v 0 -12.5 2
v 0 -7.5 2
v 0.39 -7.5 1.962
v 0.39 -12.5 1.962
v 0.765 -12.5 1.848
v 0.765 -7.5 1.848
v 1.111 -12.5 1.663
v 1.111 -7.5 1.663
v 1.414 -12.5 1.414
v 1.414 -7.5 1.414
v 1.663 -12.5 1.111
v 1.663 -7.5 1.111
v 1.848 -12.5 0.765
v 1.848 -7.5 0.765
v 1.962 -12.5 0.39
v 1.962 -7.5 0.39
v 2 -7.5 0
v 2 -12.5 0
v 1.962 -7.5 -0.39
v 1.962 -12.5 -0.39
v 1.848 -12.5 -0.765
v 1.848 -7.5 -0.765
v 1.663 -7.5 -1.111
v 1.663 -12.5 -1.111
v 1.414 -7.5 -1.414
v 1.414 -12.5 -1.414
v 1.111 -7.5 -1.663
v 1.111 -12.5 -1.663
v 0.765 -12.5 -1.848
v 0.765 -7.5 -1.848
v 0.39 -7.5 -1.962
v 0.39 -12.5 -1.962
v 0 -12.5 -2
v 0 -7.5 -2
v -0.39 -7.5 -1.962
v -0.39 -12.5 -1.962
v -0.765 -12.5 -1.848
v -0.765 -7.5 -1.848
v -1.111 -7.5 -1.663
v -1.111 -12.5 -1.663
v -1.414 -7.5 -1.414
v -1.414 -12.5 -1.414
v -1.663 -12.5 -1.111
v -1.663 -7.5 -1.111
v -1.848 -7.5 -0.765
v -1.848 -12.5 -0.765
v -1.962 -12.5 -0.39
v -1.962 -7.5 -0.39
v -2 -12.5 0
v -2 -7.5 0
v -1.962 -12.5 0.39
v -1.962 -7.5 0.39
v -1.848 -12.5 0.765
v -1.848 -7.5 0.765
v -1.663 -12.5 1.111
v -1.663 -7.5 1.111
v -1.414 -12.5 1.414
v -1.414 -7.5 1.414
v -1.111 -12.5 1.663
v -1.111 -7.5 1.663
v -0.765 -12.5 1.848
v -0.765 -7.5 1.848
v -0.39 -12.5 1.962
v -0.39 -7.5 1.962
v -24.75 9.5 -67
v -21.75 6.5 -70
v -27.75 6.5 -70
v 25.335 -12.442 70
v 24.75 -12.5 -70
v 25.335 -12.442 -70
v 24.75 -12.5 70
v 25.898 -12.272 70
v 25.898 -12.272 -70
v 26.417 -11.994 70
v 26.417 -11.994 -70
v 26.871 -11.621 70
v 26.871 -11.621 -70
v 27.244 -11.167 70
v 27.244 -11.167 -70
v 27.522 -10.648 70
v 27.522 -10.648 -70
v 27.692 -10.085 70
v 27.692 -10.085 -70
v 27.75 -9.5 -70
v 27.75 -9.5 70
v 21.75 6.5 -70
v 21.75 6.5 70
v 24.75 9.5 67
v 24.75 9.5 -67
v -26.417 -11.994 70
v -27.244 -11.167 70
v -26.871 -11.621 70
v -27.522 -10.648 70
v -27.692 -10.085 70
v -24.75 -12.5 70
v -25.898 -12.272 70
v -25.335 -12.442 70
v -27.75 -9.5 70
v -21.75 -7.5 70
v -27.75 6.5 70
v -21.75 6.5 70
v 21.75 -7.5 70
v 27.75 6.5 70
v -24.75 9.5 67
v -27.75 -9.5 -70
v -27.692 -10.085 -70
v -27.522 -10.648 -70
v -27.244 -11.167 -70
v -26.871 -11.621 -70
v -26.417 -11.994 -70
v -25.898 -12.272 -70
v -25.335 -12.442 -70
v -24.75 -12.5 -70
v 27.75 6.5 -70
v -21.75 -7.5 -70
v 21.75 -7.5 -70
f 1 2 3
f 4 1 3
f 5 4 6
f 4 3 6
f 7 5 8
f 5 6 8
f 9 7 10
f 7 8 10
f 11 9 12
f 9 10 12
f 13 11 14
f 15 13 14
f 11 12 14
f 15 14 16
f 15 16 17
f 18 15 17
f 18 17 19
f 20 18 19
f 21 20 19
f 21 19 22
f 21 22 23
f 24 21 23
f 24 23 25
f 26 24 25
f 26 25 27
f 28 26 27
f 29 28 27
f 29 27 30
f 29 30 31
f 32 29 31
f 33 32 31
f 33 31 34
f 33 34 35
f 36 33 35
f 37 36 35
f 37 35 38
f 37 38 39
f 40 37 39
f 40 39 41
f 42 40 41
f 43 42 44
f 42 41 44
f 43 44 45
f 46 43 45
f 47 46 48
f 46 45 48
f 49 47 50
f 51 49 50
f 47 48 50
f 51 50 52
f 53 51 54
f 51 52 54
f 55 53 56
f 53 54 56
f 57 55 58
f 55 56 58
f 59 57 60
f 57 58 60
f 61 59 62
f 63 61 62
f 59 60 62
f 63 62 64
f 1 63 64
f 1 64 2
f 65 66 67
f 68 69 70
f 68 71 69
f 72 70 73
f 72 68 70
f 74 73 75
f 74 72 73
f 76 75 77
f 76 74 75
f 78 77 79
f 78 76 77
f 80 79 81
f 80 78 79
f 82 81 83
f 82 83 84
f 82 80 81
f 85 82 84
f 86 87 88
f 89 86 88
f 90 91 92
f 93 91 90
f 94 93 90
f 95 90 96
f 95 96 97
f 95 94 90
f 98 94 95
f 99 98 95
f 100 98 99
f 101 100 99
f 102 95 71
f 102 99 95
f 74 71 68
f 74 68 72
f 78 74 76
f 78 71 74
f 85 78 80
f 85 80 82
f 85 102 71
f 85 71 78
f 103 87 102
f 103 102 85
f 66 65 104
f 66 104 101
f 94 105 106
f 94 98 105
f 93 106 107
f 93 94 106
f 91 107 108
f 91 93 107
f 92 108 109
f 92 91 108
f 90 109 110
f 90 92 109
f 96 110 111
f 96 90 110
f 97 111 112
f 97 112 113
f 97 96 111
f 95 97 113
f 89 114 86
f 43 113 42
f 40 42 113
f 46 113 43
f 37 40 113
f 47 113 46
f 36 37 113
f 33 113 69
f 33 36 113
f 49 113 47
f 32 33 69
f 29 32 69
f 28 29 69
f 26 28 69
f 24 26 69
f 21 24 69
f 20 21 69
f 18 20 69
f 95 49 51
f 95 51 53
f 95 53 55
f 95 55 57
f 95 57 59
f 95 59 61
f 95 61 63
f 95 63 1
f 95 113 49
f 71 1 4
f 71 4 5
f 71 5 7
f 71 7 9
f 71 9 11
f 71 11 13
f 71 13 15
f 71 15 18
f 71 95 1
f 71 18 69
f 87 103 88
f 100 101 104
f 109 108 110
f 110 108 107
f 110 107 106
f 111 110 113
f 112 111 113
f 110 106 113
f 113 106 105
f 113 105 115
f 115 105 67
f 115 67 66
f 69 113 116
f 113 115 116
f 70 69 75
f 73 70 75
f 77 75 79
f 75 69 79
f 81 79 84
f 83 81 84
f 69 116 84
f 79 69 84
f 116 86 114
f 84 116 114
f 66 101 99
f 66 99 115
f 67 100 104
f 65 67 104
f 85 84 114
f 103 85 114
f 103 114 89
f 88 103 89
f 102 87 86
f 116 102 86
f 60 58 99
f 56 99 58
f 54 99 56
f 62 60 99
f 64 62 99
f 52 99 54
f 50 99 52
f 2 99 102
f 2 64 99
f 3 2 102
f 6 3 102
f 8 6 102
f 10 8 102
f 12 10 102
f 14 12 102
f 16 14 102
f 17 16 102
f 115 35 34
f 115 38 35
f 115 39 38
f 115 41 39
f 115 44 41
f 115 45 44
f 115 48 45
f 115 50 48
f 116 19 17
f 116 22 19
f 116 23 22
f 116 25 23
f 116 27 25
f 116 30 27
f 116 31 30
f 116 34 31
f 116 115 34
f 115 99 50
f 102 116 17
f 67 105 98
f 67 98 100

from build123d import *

# Parameters (mm, degrees)
SKETCH1_W           = 55.5
SKETCH1_H           = 25
BOSS_EXTRUDE1_DEPTH = 70
SKETCH2_W           = 43.5
SKETCH2_H           = 150
CUT_EXTRUDE1_DEPTH  = 20
SKETCH3_R           = 2
CUT_EXTRUDE2_DEPTH  = 78.910605825
FILLET1_R           = 3
CHAMFER1_SIZE       = 6


with BuildPart() as part:
    # Sketch1 → Boss-Extrude1 (new, symmetric)
    with BuildSketch(Plane.XY):
        Rectangle(SKETCH1_W, SKETCH1_H)
    extrude(amount=BOSS_EXTRUDE1_DEPTH, both=True)

    # Sketch2 → Cut-Extrude1 (cut)
    with BuildSketch(Plane(origin=(0, 12.5, 0), x_dir=(1, 0, 0), z_dir=(0, 1, 0))):
        Rectangle(SKETCH2_W, SKETCH2_H)
    extrude(amount=-CUT_EXTRUDE1_DEPTH, mode=Mode.SUBTRACT)

    # Sketch3 → Cut-Extrude2 (cut, through all)
    with BuildSketch(Plane(origin=(0, -7.5, 0), x_dir=(1, 0, 0), z_dir=(0, 1, 0))):
        with Locations(Location((0, 0, 0), (0, 0, 270))):
            Circle(SKETCH3_R)
    extrude(amount=-CUT_EXTRUDE2_DEPTH, mode=Mode.SUBTRACT)

    # Fillet1
    fillet1_edges = [part.edges().sort_by_distance(p)[0] for p in [
        (27.75, -12.5, 0),
        (-27.75, -12.5, 0),
    ]]
    fillet(fillet1_edges, radius=FILLET1_R)

    # Chamfer1
    # the kernel refuses this chamfer: 6 mm, written as the material it takes off along each edge
    with BuildSketch(Plane(origin=(-6.319902072, 12.5, -70), x_dir=(0, -0.9996219169112968, -0.027495876610586778), z_dir=(-1, 0, 0)), Plane(origin=(43.180097928, 12.5, -70), x_dir=(0, -0.9996219169112968, -0.027495876610586778), z_dir=(-1, 0, 0))) as chamfer1_piece_1:
        Polygon((CHAMFER1_SIZE * 0.999621916911, CHAMFER1_SIZE * 0.0274958766106), (-CHAMFER1_SIZE * 0.0274958766106, CHAMFER1_SIZE * 0.999621916911), (0, 0), align=None)
    extrude(amount=36.860195856, mode=Mode.SUBTRACT)
    with BuildSketch(Plane(origin=(-6.319902072, 12.5, 70), x_dir=(0, -0.9996219169112968, 0.027495876610586778), z_dir=(-1, 0, 0)), Plane(origin=(43.180097928, 12.5, 70), x_dir=(0, -0.9996219169112968, 0.027495876610586778), z_dir=(-1, 0, 0))) as chamfer1_piece_2:
        Polygon((CHAMFER1_SIZE * 0.999621916911, -CHAMFER1_SIZE * 0.0274958766106), (-CHAMFER1_SIZE * 0.0274958766106, -CHAMFER1_SIZE * 0.999621916911), (0, 0), align=None)
    extrude(amount=36.860195856, mode=Mode.SUBTRACT)
    with BuildSketch(Plane(origin=(21.75, 12.5, 85.430097928), x_dir=(-0.027495876610586202, -0.9996219169112968, 0), z_dir=(0, 0, -1)), Plane(origin=(-27.75, 12.5, 85.430097928), x_dir=(-0.027495876610586202, -0.9996219169112968, 0), z_dir=(0, 0, -1)), Plane(origin=(27.75, 12.5, -85.430097928), x_dir=(0.027495876610586202, -0.9996219169112968, 0), z_dir=(0, 0, 1))) as chamfer1_piece_3:
        Polygon((CHAMFER1_SIZE * 0.999621916911, -CHAMFER1_SIZE * 0.0274958766106), (-CHAMFER1_SIZE * 0.0274958766106, -CHAMFER1_SIZE * 0.999621916911), (0, 0), align=None)
    extrude(amount=170.860195856, mode=Mode.SUBTRACT)
    with BuildSketch(Plane(origin=(-21.75, 12.5, -85.430097928), x_dir=(-0.9996219169112969, 0.027495876610586497, 0), z_dir=(0, 0, 1))) as chamfer1_piece_4:
        Polygon((CHAMFER1_SIZE * 0.999621916911, CHAMFER1_SIZE * 0.0274958766106), (-CHAMFER1_SIZE * 0.0274958766106, CHAMFER1_SIZE * 0.999621916911), (0, 0), align=None)
    extrude(amount=170.860195856, mode=Mode.SUBTRACT)


solid = part.part
